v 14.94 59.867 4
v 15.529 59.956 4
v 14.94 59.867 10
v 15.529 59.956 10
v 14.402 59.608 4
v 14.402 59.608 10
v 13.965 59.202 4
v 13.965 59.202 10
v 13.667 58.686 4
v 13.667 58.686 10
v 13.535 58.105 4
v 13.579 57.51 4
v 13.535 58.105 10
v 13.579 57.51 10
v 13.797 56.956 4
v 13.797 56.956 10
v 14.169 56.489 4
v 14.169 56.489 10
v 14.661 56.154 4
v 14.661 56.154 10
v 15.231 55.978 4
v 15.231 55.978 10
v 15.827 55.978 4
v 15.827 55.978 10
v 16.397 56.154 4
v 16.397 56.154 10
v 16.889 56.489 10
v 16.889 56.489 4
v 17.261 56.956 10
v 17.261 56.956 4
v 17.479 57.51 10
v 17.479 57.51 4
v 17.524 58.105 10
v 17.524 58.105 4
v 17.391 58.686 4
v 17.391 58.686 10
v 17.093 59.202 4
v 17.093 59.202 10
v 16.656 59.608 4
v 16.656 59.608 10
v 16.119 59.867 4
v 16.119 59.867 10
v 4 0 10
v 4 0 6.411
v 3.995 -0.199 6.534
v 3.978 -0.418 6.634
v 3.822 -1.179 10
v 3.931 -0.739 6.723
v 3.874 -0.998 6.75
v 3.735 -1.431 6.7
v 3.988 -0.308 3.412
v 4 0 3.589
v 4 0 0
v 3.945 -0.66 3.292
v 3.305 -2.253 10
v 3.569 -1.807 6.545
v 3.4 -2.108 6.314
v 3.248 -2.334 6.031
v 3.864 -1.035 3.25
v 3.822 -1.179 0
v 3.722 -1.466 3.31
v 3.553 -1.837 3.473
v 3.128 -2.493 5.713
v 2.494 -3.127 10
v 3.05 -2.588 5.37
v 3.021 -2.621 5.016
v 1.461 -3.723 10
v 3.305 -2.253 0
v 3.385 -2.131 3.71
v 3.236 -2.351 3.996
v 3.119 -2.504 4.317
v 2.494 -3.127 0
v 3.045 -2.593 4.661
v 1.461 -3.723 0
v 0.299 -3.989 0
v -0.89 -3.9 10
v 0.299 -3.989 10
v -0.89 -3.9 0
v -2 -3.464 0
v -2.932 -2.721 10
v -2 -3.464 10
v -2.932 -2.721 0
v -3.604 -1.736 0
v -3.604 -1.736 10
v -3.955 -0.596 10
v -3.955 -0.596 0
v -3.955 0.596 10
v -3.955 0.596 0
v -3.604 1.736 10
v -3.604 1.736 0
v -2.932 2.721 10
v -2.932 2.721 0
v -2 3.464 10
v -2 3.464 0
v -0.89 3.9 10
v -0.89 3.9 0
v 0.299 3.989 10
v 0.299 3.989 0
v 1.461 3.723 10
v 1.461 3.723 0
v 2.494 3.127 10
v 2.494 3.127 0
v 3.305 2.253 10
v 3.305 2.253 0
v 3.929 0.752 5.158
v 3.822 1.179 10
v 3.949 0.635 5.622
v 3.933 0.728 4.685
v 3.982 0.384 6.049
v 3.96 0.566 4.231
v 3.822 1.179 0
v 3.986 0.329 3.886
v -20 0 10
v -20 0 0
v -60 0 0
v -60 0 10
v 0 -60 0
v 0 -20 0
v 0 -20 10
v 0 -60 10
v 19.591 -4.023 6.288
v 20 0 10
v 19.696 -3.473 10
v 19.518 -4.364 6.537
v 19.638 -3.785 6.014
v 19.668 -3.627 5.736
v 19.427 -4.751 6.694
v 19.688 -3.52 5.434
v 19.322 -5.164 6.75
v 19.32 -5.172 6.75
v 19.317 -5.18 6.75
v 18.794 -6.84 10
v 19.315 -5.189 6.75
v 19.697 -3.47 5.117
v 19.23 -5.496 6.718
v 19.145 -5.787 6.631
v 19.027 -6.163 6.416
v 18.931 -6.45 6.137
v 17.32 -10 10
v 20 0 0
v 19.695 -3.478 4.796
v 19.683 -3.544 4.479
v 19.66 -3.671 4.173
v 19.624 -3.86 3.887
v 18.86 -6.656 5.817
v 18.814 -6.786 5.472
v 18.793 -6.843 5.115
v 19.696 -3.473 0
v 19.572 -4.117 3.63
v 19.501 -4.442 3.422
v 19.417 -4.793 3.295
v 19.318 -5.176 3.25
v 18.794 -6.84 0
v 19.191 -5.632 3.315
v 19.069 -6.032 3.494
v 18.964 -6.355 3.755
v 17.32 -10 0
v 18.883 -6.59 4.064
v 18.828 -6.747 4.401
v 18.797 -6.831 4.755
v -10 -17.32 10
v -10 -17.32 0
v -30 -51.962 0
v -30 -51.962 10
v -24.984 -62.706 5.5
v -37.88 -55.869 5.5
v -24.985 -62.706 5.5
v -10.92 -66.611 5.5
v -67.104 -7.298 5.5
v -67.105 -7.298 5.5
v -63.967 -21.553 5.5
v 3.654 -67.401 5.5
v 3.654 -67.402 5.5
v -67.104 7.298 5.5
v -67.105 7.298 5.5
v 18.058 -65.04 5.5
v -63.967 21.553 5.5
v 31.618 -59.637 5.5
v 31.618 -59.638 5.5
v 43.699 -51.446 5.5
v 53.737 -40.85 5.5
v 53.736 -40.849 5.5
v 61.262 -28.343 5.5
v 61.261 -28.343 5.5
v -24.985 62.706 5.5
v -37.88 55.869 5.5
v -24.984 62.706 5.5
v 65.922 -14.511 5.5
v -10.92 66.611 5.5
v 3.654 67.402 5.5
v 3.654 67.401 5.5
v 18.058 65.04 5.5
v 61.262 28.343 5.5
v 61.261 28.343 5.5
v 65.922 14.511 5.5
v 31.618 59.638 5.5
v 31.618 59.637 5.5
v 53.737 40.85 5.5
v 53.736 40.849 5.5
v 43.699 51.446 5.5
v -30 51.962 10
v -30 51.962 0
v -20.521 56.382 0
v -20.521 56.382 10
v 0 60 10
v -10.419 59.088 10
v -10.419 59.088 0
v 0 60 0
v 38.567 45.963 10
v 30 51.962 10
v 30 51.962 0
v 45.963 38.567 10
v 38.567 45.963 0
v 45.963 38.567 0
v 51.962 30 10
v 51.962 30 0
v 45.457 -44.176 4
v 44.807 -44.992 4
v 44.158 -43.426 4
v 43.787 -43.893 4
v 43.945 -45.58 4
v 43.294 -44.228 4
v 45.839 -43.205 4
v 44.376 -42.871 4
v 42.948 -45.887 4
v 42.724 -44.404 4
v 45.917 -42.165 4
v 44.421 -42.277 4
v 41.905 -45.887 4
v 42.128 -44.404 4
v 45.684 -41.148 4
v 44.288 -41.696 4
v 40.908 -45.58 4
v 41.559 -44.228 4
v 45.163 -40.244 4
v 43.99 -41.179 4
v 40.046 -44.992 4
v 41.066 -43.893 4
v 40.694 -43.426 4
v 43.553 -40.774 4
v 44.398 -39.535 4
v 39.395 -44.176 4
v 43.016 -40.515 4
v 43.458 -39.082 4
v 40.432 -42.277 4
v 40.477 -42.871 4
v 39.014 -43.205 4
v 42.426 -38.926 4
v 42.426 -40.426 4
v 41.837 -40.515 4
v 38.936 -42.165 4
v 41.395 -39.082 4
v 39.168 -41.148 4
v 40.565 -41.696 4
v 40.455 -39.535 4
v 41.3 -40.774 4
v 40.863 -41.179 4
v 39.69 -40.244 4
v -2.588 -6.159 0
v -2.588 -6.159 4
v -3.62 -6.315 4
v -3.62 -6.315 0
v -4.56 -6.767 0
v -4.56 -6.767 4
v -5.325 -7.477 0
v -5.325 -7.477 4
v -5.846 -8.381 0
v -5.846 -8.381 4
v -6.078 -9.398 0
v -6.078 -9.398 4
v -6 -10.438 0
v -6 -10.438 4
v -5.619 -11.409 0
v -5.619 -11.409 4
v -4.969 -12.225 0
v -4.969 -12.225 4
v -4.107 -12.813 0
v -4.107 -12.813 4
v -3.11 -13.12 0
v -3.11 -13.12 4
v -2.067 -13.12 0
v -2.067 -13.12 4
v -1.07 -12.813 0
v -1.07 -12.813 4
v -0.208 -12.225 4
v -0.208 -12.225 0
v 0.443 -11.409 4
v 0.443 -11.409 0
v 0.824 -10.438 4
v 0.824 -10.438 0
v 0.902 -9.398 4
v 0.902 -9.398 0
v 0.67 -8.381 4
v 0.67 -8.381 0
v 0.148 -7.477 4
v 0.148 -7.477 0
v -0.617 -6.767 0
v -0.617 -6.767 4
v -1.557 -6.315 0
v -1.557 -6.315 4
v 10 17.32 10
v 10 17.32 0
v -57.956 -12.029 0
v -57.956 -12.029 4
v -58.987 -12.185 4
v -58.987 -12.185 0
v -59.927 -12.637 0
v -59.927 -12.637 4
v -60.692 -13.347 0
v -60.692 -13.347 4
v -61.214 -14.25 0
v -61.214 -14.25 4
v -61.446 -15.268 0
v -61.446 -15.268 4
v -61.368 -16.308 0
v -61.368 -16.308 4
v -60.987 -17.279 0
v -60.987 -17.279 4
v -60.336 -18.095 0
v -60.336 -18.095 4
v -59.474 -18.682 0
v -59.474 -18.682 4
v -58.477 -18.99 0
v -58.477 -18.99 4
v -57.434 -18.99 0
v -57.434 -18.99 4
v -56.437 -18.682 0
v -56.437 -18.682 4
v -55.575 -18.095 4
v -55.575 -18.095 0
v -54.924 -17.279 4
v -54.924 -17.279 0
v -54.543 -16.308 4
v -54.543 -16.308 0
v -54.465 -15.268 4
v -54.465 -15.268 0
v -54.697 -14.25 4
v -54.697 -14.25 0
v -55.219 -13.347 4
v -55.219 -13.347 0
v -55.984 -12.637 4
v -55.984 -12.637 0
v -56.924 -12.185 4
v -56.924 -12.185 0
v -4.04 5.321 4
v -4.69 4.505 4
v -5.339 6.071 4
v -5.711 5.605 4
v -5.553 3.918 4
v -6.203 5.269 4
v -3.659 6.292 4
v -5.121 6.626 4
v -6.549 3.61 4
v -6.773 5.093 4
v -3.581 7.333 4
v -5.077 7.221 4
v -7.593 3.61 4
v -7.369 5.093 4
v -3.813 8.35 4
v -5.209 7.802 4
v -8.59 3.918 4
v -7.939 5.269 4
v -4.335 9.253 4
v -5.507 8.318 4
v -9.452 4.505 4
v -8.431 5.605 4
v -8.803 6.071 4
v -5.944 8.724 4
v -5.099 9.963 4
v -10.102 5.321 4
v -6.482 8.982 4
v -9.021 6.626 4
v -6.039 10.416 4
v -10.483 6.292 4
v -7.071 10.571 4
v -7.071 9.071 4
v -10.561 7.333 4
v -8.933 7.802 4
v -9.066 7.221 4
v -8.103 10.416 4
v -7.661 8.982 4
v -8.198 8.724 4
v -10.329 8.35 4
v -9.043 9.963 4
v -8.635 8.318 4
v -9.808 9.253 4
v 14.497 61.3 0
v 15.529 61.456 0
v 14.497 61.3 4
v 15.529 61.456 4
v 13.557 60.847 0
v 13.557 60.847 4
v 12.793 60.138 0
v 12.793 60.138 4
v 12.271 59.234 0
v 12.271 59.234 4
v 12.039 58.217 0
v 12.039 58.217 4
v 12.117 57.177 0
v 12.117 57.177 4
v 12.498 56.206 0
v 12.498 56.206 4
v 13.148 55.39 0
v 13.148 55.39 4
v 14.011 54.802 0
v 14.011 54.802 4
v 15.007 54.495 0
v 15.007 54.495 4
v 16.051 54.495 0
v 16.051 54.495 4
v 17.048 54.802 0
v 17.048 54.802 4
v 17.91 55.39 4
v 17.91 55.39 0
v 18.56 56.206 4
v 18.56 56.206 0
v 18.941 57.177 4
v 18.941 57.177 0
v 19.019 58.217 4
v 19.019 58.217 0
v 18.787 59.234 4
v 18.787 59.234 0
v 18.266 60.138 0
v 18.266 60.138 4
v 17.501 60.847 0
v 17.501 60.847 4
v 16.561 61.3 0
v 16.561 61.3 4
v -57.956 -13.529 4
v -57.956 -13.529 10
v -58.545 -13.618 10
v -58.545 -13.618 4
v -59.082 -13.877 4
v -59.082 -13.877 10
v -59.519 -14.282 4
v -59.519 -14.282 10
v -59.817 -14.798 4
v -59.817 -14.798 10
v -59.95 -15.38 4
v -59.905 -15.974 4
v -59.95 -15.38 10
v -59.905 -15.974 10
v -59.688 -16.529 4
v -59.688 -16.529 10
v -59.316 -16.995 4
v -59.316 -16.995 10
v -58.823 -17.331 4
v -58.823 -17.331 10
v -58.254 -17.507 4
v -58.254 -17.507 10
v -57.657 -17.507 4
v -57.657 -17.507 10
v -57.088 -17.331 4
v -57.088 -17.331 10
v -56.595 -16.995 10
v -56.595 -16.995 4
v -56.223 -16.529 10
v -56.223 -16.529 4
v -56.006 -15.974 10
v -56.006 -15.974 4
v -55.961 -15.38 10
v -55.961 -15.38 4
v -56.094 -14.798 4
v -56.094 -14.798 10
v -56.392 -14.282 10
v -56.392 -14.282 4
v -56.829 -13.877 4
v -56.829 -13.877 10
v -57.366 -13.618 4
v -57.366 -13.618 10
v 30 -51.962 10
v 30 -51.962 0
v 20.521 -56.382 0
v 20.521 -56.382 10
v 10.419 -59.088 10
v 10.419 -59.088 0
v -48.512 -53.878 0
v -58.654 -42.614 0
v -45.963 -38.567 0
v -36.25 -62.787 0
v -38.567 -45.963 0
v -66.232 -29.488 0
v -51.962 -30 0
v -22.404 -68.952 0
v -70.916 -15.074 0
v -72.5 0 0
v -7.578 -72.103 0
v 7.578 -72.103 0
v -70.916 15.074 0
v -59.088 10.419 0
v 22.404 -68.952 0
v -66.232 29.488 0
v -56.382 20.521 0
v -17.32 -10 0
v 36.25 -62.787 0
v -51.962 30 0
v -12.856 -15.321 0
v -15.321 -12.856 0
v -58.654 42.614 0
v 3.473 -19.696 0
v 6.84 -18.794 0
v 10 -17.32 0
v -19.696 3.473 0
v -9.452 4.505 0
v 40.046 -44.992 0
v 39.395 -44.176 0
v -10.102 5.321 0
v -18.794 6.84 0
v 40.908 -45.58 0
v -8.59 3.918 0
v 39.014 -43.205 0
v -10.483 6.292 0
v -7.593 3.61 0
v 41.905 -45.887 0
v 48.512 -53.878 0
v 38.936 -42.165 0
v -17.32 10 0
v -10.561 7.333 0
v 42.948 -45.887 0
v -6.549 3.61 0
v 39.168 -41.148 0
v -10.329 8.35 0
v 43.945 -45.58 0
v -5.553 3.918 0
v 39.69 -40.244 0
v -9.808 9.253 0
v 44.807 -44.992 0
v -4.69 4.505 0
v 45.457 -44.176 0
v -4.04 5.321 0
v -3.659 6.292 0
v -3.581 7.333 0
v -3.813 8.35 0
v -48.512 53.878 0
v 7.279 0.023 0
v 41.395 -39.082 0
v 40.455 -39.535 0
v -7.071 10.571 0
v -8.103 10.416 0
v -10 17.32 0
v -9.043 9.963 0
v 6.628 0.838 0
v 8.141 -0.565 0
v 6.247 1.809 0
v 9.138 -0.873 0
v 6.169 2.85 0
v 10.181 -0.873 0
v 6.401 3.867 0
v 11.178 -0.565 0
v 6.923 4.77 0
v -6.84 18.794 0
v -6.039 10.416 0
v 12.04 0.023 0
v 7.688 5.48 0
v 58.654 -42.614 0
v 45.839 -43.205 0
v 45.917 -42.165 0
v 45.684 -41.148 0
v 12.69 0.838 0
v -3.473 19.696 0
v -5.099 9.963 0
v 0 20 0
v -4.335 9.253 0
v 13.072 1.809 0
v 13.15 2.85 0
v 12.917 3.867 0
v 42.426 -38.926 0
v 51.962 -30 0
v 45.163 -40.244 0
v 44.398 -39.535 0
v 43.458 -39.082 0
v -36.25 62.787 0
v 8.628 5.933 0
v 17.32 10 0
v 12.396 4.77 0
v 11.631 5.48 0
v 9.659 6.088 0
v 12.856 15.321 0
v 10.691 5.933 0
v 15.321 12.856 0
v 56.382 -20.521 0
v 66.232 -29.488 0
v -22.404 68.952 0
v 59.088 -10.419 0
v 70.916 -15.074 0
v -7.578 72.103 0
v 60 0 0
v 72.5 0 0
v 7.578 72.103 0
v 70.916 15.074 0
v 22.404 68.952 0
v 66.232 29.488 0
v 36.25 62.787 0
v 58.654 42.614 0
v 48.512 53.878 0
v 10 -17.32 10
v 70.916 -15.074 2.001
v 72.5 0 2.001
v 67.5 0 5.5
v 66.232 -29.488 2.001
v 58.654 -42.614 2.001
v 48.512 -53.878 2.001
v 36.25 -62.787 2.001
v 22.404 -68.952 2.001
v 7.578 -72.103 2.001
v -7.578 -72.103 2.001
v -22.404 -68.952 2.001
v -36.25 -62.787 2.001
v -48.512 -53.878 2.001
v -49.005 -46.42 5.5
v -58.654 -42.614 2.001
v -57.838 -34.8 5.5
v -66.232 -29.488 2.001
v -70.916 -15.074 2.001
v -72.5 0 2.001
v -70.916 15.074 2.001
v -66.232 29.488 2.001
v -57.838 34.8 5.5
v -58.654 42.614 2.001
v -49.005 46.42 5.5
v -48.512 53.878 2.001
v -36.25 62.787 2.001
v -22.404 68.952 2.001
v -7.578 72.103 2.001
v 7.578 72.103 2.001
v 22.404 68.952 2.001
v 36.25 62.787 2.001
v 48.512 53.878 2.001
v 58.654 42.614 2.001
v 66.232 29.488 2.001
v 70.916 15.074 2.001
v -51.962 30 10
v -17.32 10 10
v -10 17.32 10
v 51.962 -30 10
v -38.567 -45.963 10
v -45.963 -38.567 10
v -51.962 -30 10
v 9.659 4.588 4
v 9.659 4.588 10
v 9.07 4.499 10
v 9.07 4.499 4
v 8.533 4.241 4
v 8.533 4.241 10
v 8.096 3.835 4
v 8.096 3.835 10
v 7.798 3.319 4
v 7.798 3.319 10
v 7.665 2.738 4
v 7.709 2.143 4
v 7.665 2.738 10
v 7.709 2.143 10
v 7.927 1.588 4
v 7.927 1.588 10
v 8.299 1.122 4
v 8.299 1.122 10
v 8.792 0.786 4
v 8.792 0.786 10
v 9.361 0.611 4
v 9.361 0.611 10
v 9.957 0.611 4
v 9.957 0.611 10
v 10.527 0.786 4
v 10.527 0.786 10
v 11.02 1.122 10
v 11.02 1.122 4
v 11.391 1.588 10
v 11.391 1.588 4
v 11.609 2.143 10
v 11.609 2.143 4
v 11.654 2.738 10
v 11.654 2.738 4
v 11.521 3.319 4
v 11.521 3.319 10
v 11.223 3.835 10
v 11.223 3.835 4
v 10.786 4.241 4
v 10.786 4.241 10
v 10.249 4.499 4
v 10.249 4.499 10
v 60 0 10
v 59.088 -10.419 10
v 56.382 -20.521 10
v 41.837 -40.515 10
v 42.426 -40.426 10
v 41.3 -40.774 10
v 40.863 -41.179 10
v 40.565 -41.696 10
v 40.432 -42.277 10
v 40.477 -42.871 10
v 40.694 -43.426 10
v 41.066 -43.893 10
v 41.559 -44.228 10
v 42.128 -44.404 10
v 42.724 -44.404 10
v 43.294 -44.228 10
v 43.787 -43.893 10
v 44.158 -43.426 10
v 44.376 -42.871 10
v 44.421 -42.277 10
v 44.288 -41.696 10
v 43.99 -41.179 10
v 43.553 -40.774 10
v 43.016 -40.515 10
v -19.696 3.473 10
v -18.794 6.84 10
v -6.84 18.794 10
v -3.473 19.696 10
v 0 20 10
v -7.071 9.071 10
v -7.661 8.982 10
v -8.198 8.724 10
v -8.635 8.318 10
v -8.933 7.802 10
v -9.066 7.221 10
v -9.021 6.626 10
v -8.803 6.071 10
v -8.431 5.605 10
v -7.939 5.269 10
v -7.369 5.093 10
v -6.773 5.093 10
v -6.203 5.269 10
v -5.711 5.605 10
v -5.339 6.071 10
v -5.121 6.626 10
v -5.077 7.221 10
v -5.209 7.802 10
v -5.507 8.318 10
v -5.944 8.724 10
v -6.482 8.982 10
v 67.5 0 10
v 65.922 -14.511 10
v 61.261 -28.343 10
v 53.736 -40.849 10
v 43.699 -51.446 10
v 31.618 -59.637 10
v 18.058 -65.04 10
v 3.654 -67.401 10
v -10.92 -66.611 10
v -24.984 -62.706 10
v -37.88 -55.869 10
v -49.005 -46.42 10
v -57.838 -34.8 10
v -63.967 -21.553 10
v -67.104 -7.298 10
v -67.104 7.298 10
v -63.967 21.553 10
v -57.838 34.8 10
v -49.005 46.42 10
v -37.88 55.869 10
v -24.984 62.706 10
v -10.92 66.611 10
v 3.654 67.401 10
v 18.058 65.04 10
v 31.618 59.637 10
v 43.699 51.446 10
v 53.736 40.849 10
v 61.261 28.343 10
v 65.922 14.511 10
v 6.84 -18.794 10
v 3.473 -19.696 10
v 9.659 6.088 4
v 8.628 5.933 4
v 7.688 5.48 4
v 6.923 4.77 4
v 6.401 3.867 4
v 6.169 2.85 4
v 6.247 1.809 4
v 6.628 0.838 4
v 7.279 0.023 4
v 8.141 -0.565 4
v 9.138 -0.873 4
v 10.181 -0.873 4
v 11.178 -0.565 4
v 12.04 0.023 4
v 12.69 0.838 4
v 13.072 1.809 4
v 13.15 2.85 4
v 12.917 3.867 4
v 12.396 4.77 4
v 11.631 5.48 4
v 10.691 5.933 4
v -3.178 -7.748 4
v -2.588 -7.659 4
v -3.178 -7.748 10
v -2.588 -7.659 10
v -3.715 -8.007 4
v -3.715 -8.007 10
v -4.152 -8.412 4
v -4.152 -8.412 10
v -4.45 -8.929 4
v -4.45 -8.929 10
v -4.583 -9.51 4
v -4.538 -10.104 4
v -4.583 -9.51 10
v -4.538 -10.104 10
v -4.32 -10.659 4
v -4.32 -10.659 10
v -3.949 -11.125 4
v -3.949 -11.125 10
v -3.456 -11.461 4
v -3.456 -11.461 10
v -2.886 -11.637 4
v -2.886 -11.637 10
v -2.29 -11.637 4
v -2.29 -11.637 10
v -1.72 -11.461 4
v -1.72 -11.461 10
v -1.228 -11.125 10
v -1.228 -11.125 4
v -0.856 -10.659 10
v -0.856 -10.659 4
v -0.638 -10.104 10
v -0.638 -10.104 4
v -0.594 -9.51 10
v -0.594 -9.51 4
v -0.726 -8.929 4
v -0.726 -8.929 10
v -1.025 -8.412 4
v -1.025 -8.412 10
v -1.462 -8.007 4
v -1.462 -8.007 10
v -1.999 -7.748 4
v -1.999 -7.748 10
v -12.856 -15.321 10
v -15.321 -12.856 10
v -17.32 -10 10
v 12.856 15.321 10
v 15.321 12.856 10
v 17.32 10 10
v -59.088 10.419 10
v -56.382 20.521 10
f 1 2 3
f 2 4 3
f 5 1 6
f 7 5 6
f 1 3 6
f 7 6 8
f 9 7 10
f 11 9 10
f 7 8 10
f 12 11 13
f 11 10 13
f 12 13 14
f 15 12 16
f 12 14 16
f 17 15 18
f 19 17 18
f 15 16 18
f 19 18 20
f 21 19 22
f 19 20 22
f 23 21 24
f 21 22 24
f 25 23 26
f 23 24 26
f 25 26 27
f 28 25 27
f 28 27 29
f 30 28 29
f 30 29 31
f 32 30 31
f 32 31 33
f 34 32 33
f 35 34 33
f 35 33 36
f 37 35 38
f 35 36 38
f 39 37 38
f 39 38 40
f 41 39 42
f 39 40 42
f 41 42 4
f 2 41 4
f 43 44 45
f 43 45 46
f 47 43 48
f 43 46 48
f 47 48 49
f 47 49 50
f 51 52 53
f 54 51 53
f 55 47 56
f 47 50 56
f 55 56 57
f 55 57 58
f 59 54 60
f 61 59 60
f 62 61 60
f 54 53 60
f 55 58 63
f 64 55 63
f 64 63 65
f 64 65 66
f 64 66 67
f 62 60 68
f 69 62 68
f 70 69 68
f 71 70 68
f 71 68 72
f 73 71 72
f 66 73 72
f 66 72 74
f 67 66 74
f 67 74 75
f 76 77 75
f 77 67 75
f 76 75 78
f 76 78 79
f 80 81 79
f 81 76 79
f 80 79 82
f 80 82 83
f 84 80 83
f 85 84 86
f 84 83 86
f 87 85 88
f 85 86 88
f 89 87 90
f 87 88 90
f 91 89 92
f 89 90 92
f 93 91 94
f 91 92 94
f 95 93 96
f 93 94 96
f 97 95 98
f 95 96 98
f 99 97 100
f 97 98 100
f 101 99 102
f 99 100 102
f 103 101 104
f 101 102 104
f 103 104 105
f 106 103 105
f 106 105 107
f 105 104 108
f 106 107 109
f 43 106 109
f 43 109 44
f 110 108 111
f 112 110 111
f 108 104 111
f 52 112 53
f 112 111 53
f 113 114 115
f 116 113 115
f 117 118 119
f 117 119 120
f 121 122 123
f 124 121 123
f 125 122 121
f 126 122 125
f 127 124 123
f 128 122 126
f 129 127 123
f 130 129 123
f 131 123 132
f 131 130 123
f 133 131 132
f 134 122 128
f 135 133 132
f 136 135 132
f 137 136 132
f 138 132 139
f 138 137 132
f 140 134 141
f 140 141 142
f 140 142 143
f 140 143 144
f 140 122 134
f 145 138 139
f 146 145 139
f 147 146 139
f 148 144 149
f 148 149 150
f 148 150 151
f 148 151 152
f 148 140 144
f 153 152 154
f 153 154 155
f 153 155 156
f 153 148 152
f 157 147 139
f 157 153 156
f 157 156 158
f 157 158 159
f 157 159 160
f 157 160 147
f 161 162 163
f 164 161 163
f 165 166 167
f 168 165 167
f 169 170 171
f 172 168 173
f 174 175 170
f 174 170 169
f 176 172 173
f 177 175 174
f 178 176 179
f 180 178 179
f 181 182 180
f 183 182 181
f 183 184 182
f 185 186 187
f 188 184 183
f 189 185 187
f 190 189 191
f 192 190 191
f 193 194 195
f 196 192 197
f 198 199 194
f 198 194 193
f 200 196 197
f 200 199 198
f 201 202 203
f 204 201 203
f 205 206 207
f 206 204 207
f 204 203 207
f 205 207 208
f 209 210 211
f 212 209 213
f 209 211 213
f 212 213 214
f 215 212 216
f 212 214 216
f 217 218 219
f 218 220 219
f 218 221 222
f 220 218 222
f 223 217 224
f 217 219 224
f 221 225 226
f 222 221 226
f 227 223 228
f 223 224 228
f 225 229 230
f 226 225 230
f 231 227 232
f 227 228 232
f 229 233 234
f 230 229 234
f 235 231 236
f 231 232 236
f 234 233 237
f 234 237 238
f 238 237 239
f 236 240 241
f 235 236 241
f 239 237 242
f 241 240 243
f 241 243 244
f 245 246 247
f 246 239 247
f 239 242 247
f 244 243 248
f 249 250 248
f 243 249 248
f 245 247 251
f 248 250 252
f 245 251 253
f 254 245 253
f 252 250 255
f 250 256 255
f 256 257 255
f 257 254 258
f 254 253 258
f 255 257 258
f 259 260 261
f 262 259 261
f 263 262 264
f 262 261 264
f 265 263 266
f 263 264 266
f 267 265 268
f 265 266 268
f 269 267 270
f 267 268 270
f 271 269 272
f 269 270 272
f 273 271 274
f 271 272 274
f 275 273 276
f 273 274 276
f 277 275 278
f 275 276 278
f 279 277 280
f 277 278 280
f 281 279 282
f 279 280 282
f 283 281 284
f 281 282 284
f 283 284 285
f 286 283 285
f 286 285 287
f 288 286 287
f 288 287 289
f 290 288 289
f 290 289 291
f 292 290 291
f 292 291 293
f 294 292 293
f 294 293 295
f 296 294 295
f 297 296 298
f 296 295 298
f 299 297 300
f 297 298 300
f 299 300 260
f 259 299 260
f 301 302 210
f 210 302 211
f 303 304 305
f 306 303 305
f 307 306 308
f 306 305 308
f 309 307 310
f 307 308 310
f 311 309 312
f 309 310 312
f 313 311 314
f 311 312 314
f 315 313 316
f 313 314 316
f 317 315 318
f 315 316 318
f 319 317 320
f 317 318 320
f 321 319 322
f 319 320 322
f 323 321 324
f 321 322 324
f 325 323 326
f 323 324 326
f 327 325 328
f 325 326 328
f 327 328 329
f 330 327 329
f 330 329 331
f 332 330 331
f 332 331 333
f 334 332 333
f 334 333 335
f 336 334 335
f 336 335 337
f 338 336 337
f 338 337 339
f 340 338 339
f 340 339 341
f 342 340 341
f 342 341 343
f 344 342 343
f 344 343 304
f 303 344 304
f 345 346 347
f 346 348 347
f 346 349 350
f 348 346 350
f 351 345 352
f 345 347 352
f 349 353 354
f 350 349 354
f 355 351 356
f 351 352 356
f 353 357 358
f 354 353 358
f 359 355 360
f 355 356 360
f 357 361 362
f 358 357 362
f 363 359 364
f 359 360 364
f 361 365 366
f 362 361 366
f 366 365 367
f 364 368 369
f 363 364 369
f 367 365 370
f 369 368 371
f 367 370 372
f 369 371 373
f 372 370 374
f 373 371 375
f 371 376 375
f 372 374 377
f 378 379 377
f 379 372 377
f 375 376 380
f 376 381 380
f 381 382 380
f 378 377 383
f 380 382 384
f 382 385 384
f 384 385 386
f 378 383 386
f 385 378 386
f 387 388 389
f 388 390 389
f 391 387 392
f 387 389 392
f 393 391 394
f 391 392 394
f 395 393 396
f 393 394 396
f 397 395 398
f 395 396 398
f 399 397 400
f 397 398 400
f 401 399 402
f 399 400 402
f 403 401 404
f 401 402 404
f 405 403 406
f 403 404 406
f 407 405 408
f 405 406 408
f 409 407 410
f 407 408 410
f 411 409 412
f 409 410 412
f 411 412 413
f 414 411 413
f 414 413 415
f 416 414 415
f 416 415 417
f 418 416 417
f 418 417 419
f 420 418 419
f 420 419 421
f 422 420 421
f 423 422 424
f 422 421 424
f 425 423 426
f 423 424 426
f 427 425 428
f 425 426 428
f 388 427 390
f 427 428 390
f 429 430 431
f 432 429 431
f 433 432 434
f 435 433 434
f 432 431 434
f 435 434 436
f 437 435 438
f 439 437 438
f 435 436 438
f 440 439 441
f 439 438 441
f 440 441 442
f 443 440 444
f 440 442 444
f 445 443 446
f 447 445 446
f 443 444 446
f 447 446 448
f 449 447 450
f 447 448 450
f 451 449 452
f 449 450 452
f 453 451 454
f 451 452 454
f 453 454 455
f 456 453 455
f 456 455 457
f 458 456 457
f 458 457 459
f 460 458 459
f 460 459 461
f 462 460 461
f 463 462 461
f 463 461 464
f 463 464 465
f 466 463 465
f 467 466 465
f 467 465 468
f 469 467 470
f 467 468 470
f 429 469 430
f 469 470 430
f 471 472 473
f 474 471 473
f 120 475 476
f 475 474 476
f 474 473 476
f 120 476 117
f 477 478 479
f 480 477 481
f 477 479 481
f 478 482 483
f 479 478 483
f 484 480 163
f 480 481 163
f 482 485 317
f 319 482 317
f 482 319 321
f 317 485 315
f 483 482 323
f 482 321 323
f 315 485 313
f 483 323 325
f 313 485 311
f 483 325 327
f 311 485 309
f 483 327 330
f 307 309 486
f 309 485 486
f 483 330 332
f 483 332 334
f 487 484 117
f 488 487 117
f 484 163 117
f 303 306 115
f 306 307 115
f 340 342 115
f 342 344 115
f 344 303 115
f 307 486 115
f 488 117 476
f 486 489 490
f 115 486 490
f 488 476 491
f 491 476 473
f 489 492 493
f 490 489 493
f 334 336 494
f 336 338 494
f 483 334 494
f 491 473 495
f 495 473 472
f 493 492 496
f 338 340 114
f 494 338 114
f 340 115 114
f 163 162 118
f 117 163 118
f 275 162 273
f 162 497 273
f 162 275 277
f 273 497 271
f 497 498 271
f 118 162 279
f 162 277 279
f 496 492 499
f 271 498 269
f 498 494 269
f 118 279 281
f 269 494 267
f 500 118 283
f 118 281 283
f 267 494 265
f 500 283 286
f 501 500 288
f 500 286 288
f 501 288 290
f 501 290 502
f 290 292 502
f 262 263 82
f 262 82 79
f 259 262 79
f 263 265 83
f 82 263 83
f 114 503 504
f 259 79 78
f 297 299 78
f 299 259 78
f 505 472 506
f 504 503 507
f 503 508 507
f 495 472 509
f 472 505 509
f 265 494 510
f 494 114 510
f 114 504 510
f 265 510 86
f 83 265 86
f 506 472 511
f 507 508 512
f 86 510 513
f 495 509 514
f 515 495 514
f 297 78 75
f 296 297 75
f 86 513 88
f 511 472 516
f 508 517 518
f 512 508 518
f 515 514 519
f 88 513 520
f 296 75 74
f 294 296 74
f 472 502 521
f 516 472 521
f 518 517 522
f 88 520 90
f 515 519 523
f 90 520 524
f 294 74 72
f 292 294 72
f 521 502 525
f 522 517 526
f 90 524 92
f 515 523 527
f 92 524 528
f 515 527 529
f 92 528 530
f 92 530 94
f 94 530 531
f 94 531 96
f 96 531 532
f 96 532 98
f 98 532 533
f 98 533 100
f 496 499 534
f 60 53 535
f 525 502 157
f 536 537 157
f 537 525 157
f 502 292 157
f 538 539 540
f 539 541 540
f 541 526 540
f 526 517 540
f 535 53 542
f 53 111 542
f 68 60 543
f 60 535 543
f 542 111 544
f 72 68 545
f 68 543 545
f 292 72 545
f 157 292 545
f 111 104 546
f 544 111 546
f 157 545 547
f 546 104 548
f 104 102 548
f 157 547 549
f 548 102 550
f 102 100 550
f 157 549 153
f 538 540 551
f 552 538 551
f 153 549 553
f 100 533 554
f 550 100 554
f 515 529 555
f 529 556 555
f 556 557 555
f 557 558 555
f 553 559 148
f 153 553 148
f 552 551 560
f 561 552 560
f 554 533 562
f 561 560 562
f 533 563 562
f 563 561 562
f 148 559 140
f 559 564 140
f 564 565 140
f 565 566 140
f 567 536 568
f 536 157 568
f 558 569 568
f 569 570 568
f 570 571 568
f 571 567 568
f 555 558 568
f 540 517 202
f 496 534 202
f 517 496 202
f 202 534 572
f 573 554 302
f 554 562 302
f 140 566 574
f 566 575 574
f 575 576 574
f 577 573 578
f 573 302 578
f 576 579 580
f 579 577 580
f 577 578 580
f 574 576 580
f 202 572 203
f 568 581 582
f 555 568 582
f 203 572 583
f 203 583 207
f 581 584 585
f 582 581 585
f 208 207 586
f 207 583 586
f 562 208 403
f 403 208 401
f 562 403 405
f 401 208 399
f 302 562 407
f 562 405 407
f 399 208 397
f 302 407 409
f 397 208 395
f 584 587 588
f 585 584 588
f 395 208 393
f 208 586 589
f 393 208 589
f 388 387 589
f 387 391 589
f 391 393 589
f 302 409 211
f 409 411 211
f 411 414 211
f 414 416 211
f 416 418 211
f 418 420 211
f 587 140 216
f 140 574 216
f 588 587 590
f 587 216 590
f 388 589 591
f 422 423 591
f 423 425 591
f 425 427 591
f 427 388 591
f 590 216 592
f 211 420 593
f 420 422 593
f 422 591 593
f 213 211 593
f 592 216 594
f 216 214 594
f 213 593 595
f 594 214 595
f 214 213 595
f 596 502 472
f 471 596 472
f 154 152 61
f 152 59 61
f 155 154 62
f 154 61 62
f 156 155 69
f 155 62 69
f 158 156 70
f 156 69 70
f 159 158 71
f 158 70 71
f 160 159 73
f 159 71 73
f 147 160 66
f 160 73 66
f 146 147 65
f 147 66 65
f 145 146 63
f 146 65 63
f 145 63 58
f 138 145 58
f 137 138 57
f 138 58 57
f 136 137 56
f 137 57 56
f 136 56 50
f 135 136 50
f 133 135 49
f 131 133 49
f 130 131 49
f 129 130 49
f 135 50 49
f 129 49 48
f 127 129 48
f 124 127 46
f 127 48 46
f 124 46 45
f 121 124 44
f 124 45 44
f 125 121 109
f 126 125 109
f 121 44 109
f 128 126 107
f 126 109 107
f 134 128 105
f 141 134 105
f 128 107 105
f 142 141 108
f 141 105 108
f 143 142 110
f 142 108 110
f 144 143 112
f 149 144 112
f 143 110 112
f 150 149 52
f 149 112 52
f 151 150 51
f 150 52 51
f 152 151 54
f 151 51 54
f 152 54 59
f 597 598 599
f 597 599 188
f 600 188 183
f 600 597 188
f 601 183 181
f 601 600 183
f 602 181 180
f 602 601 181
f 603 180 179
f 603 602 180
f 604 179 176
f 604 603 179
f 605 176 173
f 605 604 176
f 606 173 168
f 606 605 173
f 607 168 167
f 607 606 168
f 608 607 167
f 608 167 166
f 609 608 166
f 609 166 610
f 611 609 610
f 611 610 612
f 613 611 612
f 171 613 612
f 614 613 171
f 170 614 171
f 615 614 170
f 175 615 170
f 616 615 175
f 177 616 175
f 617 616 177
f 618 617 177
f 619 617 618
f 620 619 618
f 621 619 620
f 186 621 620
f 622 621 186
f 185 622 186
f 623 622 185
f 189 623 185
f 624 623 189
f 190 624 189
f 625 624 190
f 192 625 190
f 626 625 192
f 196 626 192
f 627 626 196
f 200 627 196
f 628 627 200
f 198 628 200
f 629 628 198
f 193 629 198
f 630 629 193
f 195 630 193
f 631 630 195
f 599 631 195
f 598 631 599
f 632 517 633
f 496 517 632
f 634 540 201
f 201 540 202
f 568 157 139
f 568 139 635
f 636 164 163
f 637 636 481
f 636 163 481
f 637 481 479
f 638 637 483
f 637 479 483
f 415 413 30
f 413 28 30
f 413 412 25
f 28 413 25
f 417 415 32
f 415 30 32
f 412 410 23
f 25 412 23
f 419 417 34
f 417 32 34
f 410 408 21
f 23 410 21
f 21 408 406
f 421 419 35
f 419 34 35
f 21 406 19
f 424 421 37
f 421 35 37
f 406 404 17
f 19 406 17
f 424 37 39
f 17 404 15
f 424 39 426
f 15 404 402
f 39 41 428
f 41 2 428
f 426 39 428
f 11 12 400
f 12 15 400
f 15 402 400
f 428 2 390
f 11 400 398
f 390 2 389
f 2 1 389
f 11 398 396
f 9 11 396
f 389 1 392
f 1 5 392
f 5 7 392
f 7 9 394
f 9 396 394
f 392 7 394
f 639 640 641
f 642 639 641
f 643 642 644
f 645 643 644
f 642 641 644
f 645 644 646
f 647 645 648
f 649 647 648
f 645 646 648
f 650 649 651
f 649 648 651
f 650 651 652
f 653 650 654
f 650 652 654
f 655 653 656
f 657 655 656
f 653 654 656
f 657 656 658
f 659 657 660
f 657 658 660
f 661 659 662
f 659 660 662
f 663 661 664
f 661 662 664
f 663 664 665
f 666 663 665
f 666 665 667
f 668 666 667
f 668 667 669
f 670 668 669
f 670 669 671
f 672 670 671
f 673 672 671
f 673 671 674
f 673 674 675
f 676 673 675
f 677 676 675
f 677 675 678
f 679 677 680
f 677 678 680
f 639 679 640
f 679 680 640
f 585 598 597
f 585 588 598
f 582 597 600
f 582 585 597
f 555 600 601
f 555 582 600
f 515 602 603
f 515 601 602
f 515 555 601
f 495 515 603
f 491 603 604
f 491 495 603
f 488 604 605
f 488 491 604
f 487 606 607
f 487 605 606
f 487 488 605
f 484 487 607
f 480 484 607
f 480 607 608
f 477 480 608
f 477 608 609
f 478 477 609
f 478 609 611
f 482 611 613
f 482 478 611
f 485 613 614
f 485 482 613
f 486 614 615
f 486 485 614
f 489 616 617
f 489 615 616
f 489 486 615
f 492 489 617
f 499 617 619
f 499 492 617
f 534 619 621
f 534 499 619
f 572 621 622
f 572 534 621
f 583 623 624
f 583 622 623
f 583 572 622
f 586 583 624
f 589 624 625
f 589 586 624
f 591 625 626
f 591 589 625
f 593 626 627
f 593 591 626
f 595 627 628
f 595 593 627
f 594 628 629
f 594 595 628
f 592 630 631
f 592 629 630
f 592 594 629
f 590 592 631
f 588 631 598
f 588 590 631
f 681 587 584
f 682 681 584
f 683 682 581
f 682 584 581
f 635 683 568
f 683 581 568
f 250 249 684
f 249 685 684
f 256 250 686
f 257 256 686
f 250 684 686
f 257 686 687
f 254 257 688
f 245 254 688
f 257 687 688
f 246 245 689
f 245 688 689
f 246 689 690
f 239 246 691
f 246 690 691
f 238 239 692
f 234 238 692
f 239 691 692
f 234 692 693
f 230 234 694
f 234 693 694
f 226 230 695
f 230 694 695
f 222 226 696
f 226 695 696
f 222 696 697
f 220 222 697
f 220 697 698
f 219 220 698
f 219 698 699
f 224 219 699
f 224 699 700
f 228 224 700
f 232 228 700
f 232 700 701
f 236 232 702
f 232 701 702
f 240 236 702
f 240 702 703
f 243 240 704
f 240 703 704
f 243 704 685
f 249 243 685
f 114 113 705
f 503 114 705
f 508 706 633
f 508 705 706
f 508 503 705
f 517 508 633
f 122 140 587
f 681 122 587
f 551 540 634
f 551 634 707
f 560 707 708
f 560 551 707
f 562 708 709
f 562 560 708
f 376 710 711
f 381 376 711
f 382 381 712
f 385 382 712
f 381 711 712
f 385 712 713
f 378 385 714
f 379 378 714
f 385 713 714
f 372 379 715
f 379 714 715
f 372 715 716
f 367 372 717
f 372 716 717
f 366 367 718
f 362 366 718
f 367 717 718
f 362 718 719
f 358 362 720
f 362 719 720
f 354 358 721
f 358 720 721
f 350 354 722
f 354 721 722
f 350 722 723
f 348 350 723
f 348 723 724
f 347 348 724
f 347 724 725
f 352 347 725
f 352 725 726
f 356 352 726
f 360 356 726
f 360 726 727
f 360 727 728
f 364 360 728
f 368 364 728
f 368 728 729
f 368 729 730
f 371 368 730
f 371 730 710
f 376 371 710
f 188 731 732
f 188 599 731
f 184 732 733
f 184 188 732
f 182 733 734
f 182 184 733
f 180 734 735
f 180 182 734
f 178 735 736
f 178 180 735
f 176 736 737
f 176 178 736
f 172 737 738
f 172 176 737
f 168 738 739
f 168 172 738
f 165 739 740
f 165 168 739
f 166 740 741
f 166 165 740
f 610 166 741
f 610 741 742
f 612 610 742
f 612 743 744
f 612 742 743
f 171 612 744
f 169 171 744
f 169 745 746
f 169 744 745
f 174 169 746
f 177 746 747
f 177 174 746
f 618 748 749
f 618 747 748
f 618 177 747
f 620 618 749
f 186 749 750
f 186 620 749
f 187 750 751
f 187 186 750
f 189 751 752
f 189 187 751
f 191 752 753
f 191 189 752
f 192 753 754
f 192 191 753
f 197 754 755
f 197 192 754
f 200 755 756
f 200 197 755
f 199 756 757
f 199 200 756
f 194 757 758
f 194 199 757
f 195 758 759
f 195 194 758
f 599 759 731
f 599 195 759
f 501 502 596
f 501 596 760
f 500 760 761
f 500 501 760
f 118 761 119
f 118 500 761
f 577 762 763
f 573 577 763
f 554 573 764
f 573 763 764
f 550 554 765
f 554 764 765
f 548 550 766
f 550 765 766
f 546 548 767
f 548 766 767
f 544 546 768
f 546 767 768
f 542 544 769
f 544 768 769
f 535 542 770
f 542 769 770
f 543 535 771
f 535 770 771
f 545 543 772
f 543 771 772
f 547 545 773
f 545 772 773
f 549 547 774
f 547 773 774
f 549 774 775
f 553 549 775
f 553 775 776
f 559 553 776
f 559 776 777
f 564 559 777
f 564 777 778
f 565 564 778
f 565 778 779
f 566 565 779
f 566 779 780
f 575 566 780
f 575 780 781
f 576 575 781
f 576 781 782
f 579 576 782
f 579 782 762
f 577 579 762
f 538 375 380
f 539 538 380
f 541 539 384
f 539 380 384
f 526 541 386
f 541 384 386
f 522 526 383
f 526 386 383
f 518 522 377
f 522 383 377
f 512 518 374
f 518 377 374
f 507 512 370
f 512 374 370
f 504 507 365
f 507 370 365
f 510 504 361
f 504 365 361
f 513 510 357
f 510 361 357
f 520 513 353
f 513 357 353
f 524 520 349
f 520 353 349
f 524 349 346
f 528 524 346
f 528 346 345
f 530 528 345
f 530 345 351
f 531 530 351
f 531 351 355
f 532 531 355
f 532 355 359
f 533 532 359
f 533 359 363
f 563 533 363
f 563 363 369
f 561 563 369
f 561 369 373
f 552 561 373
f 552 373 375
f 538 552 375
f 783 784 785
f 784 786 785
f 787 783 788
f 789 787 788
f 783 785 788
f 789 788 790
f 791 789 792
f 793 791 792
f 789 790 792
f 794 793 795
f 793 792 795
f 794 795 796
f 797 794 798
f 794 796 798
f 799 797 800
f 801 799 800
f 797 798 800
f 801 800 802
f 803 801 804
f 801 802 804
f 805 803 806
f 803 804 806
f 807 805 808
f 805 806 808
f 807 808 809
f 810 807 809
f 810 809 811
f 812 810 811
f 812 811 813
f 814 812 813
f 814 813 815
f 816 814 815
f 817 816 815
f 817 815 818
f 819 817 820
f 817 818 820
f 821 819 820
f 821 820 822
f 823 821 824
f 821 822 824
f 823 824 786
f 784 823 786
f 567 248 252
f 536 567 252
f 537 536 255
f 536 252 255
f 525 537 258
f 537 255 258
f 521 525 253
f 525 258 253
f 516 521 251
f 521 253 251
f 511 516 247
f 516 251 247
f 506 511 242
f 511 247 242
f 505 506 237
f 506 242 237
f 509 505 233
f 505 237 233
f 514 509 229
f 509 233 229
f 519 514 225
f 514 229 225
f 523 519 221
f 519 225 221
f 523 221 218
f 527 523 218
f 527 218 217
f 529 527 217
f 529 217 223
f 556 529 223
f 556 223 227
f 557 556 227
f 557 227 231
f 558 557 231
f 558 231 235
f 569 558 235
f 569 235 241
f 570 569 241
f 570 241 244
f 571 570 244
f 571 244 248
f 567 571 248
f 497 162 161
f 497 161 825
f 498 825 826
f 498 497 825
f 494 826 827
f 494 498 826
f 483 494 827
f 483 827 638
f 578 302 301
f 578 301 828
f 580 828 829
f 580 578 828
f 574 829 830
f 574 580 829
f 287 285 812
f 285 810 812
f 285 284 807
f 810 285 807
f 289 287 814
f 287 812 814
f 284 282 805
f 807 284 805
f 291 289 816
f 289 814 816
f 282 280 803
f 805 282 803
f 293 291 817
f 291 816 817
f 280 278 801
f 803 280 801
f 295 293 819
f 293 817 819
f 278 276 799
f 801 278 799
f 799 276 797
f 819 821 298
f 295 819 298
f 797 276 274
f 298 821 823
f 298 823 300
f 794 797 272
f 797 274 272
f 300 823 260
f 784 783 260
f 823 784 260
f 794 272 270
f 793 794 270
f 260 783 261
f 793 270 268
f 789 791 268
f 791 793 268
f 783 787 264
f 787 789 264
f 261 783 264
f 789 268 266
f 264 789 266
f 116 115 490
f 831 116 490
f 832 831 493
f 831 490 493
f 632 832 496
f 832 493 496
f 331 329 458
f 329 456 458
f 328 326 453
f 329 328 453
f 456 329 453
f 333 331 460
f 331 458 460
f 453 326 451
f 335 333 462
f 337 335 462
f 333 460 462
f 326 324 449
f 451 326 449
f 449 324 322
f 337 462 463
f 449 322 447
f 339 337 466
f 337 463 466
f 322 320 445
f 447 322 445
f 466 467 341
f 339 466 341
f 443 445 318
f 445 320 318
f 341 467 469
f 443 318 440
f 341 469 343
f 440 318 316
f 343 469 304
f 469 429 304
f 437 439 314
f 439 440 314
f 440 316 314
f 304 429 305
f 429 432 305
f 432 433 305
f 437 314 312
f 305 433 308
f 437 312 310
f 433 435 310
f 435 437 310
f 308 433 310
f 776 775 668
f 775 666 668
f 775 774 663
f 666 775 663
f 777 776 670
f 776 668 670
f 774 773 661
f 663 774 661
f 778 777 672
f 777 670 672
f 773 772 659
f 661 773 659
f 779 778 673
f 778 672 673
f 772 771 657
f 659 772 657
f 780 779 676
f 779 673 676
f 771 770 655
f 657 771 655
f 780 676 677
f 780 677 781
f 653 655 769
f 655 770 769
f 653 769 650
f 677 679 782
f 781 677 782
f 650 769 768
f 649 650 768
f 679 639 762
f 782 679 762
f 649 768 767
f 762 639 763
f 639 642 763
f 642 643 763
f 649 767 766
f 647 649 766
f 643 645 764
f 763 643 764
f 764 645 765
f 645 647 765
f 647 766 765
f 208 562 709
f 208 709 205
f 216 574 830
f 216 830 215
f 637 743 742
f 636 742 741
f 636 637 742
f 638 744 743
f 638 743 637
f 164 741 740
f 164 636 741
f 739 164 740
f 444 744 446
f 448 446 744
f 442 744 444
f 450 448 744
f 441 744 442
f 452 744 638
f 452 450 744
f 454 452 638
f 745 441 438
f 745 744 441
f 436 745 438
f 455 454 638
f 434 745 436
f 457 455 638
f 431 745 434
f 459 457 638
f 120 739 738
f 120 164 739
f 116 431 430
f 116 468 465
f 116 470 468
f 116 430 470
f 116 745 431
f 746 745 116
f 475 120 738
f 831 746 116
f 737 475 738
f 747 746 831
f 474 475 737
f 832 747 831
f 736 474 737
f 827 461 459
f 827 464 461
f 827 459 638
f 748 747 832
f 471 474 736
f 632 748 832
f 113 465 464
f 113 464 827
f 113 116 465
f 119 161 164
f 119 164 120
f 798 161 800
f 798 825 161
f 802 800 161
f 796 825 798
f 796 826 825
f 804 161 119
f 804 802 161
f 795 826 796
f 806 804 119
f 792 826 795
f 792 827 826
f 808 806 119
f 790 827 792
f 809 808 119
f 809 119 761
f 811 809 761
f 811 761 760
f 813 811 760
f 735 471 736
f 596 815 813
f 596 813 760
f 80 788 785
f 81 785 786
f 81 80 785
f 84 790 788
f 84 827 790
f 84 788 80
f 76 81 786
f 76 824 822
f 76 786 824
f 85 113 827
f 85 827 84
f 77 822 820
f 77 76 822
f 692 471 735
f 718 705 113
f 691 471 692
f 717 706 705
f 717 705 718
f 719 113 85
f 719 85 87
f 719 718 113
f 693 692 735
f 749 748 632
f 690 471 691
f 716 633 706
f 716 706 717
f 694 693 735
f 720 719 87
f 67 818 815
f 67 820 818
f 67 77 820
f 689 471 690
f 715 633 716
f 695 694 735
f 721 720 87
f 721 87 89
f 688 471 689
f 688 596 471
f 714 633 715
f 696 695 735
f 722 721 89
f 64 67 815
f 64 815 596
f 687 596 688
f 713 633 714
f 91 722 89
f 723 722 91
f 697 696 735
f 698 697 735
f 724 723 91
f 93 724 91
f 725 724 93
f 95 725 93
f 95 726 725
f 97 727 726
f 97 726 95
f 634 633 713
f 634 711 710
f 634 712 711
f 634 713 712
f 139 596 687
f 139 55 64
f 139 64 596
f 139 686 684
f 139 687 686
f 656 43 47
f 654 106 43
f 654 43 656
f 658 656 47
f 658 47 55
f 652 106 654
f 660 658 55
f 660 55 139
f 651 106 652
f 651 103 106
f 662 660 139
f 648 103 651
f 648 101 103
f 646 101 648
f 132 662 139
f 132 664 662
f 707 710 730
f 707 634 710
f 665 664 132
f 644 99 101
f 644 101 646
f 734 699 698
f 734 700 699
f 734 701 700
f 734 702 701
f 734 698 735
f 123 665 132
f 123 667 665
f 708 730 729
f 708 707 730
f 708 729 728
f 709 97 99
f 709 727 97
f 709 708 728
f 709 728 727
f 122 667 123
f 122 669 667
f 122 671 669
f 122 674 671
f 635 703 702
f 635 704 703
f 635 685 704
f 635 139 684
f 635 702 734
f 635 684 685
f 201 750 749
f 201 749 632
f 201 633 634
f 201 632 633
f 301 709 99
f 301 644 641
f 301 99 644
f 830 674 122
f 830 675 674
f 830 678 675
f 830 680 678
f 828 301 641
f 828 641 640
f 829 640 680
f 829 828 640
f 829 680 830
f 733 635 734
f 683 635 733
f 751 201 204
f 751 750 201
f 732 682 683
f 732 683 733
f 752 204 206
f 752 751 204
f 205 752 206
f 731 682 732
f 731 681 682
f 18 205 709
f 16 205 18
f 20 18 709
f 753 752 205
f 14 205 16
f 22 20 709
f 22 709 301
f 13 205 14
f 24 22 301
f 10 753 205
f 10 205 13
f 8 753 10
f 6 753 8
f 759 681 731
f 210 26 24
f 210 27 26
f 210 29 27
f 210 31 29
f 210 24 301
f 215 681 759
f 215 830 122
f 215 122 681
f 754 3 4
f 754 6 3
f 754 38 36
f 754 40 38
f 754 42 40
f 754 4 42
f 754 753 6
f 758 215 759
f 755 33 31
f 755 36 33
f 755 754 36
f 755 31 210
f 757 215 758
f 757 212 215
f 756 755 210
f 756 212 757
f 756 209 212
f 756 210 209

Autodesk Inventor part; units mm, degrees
ref_plane "YZ Plane" through (0, 0, 0) normal (1, 0, 0) x (0, 1, 0)
ref_plane "XZ Plane" through (0, 0, 0) normal (0, 1, 0) x (-1, 0, 0)
sketch "Sketch1" plane through (0, 0, 0) normal (0, 0, 1) x (1, 0, 0)
  circle A0 centre (0, 0) radius 72.5
  circle A1 centre (0, 0) radius 67.5
  circle A2 centre (0, 0) radius 4
  line L0 (0, 20) -> (0, 60)
  arc A3 (0, 20) -> (-10, 17.3205) centre (0, 0) ccw
  line L1 (0, 0) -> (-10, 17.3205) construction
  line L2 (0, 0) -> (0, 20) construction
  arc A4 (0, 60) -> (-30, 51.9615) centre (0, 0) ccw
  line L3 (0, 0) -> (-30, 51.9615) construction
  line L4 (0, 0) -> (0, 60) construction
  line L5 (-10, 17.3205) -> (-30, 51.9615)
  line L6 (-17.3205, 10) -> (-51.9615, 30)
  arc A5 (-17.3205, 10) -> (-20, 0) centre (0, 0) ccw
  line L7 (0, 0) -> (-20, 0) construction
  line L8 (0, 0) -> (-17.3205, 10) construction
  arc A6 (-51.9615, 30) -> (-60, 0) centre (0, 0) ccw
  line L9 (0, 0) -> (-60, 0) construction
  line L10 (0, 0) -> (-51.9615, 30) construction
  line L11 (-20, 0) -> (-60, 0)
  line L12 (-17.3205, -10) -> (-51.9615, -30)
  arc A7 (-17.3205, -10) -> (-10, -17.3205) centre (0, 0) ccw
  line L13 (0, 0) -> (-10, -17.3205) construction
  line L14 (0, 0) -> (-17.3205, -10) construction
  arc A8 (-51.9615, -30) -> (-30, -51.9615) centre (0, 0) ccw
  line L15 (0, 0) -> (-30, -51.9615) construction
  line L16 (0, 0) -> (-51.9615, -30) construction
  line L17 (-10, -17.3205) -> (-30, -51.9615)
  line L18 (0, -20) -> (0, -60)
  arc A9 (0, -20) -> (10, -17.3205) centre (0, 0) ccw
  line L19 (0, 0) -> (10, -17.3205) construction
  line L20 (0, 0) -> (0, -20) construction
  arc A10 (0, -60) -> (30, -51.9615) centre (0, 0) ccw
  line L21 (0, 0) -> (30, -51.9615) construction
  line L22 (0, 0) -> (0, -60) construction
  line L23 (10, -17.3205) -> (30, -51.9615)
  line L24 (17.3205, -10) -> (51.9615, -30)
  arc A11 (17.3205, -10) -> (20, 0) centre (0, 0) ccw
  line L25 (0, 0) -> (20, 0) construction
  line L26 (0, 0) -> (17.3205, -10) construction
  arc A12 (51.9615, -30) -> (60, 0) centre (0, 0) ccw
  line L27 (0, 0) -> (60, 0) construction
  line L28 (0, 0) -> (51.9615, -30) construction
  line L29 (20, 0) -> (60, 0)
  line L30 (17.3205, 10) -> (51.9615, 30)
  arc A13 (17.3205, 10) -> (10, 17.3205) centre (0, 0) ccw
  line L31 (0, 0) -> (10, 17.3205) construction
  line L32 (0, 0) -> (17.3205, 10) construction
  arc A14 (51.9615, 30) -> (30, 51.9615) centre (0, 0) ccw
  line L33 (0, 0) -> (30, 51.9615) construction
  line L34 (0, 0) -> (51.9615, 30) construction
  line L35 (10, 17.3205) -> (30, 51.9615)
  point P0 (0, 10)
  point P1 (-2.5882, 9.6593)
  point P2 (-5, 8.6603)
  point P3 (-7.0711, 7.0711)
  point P4 (-8.6603, 5)
  point P5 (-9.6593, 2.5882)
  point P6 (-10, 0)
  point P7 (-9.6593, -2.5882)
  point P8 (-8.6603, -5)
  point P9 (-7.0711, -7.0711)
  point P10 (-5, -8.6603)
  point P11 (-2.5882, -9.6593)
  point P12 (0, -10)
  point P13 (2.5882, -9.6593)
  point P14 (5, -8.6603)
  point P15 (7.0711, -7.0711)
  point P16 (8.6603, -5)
  point P17 (9.6593, -2.5882)
  point P18 (10, 0)
  point P19 (9.6593, 2.5882)
  point P20 (8.6603, 5)
  point P21 (7.0711, 7.0711)
  point P22 (5, 8.6603)
  point P23 (2.5882, 9.6593)
  point P24 (15.5291, -57.9555)
  point P25 (30, -51.9615)
  point P26 (42.4264, -42.4264)
  point P27 (51.9615, -30)
  point P28 (57.9555, -15.5291)
  point P29 (60, 0)
  point P30 (57.9555, 15.5291)
  point P31 (51.9615, 30)
  point P32 (42.4264, 42.4264)
  point P33 (30, 51.9615)
  point P34 (15.5291, 57.9555)
  point P35 (0, 60)
  point P36 (-15.5291, 57.9555)
  point P37 (-30, 51.9615)
  point P38 (-42.4264, 42.4264)
  point P39 (-51.9615, 30)
  point P40 (-57.9555, 15.5291)
  point P41 (-60, 0)
  point P42 (-57.9555, -15.5291)
  point P43 (-51.9615, -30)
  point P44 (-42.4264, -42.4264)
  point P45 (-30, -51.9615)
  point P46 (-15.5291, -57.9555)
  dimension "d1" = 135
  dimension "d2" = 8
  dimension "d11" = 40
  dimension "d12" = 20
  dimension "d13" = 30
  dimension "d14" = 30
  dimension "d17" = 360
  dimension "d34" = 10
  dimension "d37" = 360
  dimension "d48" = 360
  dimension "d57" = 145
extrude "Extrusion1" add sketch "Sketch1" along normal blind 10 contours A1
extrude "Extrusion2" add sketch "Sketch1" along normal blind 5.5 contours A0
hole "Hole2" at (-2.5882, -9.6593, 0) at (-7.0711, 7.0711, 0) at (9.6593, 2.5882, 0) direction (0, 0, 1) diameter 4 end through all counterbore diameter 7 counterbore depth 4
hole "Hole3" at (42.4264, -42.4264, 0) at (-57.9555, -15.5291, 0) at (15.5291, 57.9555, 0) direction (0, 0, 1) diameter 4 end through all counterbore diameter 7 counterbore depth 4
chamfer "Chamfer2" distance 3.5 distance2 5 1 edges at (-72.5, 0, 5.5) measured on face at (72.06, -7.9756, 1.8333)
ref_plane "Work Plane3" through (19.3185, -5.1764, 0) normal (-0.9659, 0.2588, 0) x (-0.2588, -0.9659, 0)
sketch "Sketch3" plane through (19.3185, -5.1764, 0) normal (-0.9659, 0.2588, 0) x (-0.2588, -0.9659, 0)
  point P0 (0, 0)
  point P1 (0, 5)
  dimension "d61" = 5
hole "Hole4" at (19.3185, -5.1764, 5) direction (-0.9659, 0.2588, 0) diameter 3.5 depth 20
properties part number "wheel" material "UHMW, Black"
